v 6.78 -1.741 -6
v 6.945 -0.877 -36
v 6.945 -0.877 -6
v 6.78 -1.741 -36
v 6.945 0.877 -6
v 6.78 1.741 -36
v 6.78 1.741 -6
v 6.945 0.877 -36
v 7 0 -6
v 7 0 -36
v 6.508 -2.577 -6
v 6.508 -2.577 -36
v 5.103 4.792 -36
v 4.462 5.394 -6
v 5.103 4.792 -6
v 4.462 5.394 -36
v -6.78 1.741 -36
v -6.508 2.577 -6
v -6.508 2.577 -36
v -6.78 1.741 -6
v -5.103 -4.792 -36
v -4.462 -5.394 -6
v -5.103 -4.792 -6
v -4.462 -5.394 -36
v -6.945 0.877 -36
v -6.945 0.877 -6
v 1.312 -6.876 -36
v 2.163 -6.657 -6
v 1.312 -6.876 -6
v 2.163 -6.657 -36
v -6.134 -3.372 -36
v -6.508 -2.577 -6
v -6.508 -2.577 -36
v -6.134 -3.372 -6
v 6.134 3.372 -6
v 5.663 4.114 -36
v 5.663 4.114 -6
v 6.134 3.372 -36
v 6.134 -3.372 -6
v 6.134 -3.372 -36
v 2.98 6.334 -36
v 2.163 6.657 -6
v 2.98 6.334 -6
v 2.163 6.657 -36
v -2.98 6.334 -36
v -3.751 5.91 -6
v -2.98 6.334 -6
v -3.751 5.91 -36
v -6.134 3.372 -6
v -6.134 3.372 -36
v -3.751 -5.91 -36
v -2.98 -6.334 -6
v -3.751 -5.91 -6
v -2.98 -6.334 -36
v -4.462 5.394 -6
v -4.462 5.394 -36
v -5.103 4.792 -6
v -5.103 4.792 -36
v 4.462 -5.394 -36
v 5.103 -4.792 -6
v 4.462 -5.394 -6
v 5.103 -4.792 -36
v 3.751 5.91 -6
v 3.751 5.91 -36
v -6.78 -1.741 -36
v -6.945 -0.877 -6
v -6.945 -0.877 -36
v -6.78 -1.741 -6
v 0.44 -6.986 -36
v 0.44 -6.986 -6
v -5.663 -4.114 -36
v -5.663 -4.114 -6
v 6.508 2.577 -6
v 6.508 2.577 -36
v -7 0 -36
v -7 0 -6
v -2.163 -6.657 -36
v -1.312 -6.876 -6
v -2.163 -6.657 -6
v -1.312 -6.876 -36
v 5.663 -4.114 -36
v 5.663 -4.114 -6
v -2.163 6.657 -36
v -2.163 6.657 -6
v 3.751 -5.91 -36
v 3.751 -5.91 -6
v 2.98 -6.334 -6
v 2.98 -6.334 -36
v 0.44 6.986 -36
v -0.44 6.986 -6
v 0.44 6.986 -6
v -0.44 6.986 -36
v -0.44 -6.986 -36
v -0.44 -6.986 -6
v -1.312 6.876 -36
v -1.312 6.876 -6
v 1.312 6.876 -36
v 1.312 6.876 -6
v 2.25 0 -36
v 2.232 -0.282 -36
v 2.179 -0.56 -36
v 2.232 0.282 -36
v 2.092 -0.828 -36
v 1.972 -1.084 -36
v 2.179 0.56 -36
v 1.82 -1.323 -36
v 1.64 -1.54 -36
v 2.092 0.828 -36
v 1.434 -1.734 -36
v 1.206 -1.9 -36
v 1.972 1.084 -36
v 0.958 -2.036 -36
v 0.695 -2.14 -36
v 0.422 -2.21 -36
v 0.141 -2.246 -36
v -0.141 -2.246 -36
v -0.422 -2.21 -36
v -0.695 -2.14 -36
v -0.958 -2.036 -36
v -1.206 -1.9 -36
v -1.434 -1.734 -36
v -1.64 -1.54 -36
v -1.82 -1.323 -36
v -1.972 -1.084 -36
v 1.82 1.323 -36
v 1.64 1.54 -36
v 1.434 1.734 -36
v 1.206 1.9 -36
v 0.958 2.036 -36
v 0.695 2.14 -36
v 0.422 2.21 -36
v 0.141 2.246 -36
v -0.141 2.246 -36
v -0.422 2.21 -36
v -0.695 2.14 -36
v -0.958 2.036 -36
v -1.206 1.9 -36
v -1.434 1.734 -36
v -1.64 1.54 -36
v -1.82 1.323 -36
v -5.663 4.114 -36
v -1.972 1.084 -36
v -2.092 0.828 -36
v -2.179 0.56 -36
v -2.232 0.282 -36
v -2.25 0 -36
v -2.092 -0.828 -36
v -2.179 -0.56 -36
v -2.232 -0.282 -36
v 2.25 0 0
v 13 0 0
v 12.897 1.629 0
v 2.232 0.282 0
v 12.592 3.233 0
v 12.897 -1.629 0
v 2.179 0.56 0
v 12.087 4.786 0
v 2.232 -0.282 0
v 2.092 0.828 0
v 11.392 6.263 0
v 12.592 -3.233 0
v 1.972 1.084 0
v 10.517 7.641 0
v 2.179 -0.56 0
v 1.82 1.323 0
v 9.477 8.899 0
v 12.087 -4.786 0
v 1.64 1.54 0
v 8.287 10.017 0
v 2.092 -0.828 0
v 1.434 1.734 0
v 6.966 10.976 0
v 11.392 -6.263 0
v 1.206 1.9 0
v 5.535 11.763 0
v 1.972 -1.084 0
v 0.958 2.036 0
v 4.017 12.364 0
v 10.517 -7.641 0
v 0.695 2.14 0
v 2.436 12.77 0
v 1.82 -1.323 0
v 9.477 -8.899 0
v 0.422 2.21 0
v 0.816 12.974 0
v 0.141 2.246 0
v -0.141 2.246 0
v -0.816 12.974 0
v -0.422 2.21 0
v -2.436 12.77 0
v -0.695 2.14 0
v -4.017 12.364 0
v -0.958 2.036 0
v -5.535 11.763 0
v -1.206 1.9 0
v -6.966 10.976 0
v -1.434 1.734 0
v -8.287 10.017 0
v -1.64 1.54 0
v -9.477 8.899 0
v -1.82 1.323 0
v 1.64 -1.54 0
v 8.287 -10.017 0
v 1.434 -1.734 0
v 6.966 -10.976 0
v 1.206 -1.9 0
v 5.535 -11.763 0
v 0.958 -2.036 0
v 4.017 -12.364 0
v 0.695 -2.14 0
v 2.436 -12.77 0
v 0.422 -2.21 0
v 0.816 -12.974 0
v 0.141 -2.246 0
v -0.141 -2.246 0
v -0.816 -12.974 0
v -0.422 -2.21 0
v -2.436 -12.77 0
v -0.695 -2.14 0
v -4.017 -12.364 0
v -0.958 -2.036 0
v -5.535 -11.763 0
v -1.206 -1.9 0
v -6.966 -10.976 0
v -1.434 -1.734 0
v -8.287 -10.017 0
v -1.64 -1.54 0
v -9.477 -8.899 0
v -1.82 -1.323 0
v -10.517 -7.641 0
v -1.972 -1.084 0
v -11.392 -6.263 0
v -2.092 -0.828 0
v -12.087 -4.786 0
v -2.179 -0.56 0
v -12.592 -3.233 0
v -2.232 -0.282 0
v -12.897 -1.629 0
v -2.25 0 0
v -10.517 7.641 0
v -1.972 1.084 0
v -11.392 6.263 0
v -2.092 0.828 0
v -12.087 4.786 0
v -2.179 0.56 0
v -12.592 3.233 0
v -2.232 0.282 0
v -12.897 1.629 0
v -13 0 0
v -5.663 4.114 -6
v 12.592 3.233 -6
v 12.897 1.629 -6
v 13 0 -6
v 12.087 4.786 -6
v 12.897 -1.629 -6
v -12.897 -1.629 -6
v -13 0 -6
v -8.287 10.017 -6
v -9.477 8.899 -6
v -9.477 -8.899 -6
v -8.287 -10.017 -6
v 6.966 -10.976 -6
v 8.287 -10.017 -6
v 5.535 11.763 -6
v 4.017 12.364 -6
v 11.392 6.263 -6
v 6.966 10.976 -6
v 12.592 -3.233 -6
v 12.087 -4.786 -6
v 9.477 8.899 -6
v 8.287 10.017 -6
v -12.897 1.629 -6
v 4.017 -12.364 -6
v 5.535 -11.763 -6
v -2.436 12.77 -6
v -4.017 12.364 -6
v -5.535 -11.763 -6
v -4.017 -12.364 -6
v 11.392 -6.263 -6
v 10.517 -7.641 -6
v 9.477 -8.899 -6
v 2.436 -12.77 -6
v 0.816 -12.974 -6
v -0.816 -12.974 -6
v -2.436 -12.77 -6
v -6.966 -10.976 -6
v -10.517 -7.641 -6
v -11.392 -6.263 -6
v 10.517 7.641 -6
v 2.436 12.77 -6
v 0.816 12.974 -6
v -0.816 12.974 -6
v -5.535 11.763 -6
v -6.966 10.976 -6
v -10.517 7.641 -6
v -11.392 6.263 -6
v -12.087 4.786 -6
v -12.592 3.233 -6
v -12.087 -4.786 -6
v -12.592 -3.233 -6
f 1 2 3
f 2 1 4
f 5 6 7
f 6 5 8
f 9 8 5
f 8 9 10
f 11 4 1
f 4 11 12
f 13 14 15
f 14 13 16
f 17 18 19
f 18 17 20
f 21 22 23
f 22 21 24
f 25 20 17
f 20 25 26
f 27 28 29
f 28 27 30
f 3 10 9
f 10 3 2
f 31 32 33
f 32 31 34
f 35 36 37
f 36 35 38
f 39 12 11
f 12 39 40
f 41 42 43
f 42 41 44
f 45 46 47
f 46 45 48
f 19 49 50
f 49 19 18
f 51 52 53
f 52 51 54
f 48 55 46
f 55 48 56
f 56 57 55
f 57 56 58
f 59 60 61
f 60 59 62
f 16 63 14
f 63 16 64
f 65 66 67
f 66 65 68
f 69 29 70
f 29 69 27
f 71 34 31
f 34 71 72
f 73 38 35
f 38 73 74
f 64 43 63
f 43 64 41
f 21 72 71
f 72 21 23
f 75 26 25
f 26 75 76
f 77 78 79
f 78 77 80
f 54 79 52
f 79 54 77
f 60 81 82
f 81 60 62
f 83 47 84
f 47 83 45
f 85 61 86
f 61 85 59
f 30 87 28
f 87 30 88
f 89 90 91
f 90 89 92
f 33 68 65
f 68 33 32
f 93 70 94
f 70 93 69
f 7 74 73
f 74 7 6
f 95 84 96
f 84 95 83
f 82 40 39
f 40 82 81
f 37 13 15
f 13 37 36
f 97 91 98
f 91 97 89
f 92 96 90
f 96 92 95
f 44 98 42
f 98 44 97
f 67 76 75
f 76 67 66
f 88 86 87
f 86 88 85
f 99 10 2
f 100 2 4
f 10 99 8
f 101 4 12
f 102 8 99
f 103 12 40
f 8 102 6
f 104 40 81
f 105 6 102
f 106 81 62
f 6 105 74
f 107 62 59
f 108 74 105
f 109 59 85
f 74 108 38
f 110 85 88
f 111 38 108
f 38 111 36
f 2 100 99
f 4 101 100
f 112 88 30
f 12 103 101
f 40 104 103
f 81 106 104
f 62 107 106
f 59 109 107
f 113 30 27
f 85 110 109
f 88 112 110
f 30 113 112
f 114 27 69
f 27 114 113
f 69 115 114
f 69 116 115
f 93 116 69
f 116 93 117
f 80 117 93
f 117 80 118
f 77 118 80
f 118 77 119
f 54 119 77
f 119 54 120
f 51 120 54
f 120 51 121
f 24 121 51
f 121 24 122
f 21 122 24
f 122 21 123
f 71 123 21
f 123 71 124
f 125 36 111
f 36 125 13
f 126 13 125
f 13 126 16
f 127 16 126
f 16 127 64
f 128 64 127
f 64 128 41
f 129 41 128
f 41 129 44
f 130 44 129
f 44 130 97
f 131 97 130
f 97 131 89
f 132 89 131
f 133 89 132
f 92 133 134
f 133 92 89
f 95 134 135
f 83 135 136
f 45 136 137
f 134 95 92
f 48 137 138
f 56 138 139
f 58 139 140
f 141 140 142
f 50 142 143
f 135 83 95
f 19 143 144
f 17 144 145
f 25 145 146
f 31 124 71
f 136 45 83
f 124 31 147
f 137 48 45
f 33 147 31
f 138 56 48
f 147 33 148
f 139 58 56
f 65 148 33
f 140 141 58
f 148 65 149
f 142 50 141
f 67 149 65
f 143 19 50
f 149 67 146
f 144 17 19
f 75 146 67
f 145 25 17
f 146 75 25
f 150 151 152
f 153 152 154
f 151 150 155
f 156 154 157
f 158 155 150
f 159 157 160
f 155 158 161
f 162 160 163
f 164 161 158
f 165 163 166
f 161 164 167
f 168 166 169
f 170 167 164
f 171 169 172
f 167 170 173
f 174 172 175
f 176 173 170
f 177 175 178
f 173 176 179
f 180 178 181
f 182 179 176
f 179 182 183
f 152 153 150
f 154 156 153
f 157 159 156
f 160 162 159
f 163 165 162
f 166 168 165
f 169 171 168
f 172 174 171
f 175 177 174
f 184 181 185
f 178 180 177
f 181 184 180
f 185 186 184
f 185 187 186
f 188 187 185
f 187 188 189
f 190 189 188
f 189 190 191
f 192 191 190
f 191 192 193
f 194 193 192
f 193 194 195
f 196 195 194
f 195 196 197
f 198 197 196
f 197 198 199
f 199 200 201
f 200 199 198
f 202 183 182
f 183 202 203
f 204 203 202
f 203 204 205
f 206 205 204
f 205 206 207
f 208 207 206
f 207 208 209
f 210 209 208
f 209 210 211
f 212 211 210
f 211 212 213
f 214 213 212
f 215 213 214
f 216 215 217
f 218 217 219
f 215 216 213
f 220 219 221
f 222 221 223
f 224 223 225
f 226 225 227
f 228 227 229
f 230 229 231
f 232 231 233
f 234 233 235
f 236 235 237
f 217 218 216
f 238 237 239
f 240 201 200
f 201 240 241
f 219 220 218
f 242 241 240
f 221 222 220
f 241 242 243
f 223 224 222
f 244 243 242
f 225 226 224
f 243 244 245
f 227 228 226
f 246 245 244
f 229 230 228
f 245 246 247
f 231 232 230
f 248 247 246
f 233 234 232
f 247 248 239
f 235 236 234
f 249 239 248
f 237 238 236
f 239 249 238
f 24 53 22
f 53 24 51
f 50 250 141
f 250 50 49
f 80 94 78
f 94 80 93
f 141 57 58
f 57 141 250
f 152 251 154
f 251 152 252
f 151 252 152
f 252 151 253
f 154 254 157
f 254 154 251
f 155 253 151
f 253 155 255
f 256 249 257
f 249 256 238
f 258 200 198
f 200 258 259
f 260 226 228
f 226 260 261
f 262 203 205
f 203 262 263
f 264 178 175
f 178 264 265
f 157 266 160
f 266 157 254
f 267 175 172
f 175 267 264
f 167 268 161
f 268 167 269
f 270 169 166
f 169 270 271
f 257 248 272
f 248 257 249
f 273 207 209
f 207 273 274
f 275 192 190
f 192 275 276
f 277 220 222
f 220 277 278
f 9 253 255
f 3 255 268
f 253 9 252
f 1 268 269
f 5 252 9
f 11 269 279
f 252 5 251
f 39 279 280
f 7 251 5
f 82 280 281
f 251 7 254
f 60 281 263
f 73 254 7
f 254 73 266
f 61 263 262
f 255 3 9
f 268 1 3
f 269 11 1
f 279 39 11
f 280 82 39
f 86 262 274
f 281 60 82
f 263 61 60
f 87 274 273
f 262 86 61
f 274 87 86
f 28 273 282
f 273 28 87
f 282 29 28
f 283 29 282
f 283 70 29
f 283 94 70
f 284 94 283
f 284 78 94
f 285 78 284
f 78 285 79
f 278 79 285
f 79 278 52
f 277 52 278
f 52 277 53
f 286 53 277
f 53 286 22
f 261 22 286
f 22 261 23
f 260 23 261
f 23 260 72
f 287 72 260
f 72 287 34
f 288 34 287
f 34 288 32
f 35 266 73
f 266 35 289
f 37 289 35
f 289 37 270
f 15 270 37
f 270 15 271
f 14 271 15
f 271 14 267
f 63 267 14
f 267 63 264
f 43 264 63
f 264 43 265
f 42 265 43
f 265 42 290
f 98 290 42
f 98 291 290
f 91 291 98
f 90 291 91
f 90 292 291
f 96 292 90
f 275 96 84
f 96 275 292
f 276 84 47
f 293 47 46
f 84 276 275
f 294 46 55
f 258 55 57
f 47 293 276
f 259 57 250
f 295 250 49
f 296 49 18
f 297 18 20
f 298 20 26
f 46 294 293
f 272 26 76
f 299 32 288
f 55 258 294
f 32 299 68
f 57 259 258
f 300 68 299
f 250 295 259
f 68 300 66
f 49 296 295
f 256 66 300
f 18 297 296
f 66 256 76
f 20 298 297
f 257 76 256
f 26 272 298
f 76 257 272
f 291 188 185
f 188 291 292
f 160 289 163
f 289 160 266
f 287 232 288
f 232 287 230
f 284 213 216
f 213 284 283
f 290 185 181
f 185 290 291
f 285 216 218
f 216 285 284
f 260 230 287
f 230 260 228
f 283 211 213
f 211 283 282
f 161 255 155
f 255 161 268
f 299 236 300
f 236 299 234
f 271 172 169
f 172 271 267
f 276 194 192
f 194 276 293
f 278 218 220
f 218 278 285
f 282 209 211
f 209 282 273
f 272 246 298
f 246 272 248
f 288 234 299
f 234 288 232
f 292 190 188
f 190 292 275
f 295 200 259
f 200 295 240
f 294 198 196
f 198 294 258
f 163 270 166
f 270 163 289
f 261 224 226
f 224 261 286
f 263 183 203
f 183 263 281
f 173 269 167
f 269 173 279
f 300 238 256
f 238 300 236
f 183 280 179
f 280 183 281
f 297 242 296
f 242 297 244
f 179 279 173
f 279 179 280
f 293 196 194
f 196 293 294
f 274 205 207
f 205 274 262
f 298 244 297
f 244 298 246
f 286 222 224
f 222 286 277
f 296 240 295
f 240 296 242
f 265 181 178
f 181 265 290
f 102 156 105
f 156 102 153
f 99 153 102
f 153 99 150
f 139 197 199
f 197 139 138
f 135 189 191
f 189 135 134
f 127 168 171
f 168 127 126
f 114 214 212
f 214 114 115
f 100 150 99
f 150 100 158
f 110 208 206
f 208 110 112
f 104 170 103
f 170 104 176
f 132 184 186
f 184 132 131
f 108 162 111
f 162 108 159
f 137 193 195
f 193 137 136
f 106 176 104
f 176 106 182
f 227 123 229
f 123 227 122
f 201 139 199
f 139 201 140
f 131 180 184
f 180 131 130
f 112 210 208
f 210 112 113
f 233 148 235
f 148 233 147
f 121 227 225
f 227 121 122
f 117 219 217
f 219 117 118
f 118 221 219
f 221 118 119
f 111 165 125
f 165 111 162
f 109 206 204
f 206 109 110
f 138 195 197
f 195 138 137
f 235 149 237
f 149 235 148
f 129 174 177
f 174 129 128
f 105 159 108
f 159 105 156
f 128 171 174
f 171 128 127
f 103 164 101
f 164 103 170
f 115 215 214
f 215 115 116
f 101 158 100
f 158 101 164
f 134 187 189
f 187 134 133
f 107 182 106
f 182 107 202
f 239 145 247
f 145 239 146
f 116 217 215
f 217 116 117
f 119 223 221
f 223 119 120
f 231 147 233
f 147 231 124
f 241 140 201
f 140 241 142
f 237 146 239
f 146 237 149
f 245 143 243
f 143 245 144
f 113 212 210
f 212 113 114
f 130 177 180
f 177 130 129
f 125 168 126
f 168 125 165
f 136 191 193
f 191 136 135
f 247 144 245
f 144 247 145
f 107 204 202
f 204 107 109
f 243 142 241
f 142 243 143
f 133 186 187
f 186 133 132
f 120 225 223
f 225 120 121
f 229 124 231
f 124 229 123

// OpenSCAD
$fn = 50;


difference() {
	union() {
		translate(v = [0, 0, -36.0000000000]) {
			cylinder(h = 36, r = 7.0000000000);
		}
		translate(v = [0, 0, -6.0000000000]) {
			cylinder(h = 6, r = 13.0000000000);
		}
	}
	union() {
		#translate(v = [0, 0, -36]) {
			cylinder(h = 36, r = 2.2500000000);
		}
	}
}
